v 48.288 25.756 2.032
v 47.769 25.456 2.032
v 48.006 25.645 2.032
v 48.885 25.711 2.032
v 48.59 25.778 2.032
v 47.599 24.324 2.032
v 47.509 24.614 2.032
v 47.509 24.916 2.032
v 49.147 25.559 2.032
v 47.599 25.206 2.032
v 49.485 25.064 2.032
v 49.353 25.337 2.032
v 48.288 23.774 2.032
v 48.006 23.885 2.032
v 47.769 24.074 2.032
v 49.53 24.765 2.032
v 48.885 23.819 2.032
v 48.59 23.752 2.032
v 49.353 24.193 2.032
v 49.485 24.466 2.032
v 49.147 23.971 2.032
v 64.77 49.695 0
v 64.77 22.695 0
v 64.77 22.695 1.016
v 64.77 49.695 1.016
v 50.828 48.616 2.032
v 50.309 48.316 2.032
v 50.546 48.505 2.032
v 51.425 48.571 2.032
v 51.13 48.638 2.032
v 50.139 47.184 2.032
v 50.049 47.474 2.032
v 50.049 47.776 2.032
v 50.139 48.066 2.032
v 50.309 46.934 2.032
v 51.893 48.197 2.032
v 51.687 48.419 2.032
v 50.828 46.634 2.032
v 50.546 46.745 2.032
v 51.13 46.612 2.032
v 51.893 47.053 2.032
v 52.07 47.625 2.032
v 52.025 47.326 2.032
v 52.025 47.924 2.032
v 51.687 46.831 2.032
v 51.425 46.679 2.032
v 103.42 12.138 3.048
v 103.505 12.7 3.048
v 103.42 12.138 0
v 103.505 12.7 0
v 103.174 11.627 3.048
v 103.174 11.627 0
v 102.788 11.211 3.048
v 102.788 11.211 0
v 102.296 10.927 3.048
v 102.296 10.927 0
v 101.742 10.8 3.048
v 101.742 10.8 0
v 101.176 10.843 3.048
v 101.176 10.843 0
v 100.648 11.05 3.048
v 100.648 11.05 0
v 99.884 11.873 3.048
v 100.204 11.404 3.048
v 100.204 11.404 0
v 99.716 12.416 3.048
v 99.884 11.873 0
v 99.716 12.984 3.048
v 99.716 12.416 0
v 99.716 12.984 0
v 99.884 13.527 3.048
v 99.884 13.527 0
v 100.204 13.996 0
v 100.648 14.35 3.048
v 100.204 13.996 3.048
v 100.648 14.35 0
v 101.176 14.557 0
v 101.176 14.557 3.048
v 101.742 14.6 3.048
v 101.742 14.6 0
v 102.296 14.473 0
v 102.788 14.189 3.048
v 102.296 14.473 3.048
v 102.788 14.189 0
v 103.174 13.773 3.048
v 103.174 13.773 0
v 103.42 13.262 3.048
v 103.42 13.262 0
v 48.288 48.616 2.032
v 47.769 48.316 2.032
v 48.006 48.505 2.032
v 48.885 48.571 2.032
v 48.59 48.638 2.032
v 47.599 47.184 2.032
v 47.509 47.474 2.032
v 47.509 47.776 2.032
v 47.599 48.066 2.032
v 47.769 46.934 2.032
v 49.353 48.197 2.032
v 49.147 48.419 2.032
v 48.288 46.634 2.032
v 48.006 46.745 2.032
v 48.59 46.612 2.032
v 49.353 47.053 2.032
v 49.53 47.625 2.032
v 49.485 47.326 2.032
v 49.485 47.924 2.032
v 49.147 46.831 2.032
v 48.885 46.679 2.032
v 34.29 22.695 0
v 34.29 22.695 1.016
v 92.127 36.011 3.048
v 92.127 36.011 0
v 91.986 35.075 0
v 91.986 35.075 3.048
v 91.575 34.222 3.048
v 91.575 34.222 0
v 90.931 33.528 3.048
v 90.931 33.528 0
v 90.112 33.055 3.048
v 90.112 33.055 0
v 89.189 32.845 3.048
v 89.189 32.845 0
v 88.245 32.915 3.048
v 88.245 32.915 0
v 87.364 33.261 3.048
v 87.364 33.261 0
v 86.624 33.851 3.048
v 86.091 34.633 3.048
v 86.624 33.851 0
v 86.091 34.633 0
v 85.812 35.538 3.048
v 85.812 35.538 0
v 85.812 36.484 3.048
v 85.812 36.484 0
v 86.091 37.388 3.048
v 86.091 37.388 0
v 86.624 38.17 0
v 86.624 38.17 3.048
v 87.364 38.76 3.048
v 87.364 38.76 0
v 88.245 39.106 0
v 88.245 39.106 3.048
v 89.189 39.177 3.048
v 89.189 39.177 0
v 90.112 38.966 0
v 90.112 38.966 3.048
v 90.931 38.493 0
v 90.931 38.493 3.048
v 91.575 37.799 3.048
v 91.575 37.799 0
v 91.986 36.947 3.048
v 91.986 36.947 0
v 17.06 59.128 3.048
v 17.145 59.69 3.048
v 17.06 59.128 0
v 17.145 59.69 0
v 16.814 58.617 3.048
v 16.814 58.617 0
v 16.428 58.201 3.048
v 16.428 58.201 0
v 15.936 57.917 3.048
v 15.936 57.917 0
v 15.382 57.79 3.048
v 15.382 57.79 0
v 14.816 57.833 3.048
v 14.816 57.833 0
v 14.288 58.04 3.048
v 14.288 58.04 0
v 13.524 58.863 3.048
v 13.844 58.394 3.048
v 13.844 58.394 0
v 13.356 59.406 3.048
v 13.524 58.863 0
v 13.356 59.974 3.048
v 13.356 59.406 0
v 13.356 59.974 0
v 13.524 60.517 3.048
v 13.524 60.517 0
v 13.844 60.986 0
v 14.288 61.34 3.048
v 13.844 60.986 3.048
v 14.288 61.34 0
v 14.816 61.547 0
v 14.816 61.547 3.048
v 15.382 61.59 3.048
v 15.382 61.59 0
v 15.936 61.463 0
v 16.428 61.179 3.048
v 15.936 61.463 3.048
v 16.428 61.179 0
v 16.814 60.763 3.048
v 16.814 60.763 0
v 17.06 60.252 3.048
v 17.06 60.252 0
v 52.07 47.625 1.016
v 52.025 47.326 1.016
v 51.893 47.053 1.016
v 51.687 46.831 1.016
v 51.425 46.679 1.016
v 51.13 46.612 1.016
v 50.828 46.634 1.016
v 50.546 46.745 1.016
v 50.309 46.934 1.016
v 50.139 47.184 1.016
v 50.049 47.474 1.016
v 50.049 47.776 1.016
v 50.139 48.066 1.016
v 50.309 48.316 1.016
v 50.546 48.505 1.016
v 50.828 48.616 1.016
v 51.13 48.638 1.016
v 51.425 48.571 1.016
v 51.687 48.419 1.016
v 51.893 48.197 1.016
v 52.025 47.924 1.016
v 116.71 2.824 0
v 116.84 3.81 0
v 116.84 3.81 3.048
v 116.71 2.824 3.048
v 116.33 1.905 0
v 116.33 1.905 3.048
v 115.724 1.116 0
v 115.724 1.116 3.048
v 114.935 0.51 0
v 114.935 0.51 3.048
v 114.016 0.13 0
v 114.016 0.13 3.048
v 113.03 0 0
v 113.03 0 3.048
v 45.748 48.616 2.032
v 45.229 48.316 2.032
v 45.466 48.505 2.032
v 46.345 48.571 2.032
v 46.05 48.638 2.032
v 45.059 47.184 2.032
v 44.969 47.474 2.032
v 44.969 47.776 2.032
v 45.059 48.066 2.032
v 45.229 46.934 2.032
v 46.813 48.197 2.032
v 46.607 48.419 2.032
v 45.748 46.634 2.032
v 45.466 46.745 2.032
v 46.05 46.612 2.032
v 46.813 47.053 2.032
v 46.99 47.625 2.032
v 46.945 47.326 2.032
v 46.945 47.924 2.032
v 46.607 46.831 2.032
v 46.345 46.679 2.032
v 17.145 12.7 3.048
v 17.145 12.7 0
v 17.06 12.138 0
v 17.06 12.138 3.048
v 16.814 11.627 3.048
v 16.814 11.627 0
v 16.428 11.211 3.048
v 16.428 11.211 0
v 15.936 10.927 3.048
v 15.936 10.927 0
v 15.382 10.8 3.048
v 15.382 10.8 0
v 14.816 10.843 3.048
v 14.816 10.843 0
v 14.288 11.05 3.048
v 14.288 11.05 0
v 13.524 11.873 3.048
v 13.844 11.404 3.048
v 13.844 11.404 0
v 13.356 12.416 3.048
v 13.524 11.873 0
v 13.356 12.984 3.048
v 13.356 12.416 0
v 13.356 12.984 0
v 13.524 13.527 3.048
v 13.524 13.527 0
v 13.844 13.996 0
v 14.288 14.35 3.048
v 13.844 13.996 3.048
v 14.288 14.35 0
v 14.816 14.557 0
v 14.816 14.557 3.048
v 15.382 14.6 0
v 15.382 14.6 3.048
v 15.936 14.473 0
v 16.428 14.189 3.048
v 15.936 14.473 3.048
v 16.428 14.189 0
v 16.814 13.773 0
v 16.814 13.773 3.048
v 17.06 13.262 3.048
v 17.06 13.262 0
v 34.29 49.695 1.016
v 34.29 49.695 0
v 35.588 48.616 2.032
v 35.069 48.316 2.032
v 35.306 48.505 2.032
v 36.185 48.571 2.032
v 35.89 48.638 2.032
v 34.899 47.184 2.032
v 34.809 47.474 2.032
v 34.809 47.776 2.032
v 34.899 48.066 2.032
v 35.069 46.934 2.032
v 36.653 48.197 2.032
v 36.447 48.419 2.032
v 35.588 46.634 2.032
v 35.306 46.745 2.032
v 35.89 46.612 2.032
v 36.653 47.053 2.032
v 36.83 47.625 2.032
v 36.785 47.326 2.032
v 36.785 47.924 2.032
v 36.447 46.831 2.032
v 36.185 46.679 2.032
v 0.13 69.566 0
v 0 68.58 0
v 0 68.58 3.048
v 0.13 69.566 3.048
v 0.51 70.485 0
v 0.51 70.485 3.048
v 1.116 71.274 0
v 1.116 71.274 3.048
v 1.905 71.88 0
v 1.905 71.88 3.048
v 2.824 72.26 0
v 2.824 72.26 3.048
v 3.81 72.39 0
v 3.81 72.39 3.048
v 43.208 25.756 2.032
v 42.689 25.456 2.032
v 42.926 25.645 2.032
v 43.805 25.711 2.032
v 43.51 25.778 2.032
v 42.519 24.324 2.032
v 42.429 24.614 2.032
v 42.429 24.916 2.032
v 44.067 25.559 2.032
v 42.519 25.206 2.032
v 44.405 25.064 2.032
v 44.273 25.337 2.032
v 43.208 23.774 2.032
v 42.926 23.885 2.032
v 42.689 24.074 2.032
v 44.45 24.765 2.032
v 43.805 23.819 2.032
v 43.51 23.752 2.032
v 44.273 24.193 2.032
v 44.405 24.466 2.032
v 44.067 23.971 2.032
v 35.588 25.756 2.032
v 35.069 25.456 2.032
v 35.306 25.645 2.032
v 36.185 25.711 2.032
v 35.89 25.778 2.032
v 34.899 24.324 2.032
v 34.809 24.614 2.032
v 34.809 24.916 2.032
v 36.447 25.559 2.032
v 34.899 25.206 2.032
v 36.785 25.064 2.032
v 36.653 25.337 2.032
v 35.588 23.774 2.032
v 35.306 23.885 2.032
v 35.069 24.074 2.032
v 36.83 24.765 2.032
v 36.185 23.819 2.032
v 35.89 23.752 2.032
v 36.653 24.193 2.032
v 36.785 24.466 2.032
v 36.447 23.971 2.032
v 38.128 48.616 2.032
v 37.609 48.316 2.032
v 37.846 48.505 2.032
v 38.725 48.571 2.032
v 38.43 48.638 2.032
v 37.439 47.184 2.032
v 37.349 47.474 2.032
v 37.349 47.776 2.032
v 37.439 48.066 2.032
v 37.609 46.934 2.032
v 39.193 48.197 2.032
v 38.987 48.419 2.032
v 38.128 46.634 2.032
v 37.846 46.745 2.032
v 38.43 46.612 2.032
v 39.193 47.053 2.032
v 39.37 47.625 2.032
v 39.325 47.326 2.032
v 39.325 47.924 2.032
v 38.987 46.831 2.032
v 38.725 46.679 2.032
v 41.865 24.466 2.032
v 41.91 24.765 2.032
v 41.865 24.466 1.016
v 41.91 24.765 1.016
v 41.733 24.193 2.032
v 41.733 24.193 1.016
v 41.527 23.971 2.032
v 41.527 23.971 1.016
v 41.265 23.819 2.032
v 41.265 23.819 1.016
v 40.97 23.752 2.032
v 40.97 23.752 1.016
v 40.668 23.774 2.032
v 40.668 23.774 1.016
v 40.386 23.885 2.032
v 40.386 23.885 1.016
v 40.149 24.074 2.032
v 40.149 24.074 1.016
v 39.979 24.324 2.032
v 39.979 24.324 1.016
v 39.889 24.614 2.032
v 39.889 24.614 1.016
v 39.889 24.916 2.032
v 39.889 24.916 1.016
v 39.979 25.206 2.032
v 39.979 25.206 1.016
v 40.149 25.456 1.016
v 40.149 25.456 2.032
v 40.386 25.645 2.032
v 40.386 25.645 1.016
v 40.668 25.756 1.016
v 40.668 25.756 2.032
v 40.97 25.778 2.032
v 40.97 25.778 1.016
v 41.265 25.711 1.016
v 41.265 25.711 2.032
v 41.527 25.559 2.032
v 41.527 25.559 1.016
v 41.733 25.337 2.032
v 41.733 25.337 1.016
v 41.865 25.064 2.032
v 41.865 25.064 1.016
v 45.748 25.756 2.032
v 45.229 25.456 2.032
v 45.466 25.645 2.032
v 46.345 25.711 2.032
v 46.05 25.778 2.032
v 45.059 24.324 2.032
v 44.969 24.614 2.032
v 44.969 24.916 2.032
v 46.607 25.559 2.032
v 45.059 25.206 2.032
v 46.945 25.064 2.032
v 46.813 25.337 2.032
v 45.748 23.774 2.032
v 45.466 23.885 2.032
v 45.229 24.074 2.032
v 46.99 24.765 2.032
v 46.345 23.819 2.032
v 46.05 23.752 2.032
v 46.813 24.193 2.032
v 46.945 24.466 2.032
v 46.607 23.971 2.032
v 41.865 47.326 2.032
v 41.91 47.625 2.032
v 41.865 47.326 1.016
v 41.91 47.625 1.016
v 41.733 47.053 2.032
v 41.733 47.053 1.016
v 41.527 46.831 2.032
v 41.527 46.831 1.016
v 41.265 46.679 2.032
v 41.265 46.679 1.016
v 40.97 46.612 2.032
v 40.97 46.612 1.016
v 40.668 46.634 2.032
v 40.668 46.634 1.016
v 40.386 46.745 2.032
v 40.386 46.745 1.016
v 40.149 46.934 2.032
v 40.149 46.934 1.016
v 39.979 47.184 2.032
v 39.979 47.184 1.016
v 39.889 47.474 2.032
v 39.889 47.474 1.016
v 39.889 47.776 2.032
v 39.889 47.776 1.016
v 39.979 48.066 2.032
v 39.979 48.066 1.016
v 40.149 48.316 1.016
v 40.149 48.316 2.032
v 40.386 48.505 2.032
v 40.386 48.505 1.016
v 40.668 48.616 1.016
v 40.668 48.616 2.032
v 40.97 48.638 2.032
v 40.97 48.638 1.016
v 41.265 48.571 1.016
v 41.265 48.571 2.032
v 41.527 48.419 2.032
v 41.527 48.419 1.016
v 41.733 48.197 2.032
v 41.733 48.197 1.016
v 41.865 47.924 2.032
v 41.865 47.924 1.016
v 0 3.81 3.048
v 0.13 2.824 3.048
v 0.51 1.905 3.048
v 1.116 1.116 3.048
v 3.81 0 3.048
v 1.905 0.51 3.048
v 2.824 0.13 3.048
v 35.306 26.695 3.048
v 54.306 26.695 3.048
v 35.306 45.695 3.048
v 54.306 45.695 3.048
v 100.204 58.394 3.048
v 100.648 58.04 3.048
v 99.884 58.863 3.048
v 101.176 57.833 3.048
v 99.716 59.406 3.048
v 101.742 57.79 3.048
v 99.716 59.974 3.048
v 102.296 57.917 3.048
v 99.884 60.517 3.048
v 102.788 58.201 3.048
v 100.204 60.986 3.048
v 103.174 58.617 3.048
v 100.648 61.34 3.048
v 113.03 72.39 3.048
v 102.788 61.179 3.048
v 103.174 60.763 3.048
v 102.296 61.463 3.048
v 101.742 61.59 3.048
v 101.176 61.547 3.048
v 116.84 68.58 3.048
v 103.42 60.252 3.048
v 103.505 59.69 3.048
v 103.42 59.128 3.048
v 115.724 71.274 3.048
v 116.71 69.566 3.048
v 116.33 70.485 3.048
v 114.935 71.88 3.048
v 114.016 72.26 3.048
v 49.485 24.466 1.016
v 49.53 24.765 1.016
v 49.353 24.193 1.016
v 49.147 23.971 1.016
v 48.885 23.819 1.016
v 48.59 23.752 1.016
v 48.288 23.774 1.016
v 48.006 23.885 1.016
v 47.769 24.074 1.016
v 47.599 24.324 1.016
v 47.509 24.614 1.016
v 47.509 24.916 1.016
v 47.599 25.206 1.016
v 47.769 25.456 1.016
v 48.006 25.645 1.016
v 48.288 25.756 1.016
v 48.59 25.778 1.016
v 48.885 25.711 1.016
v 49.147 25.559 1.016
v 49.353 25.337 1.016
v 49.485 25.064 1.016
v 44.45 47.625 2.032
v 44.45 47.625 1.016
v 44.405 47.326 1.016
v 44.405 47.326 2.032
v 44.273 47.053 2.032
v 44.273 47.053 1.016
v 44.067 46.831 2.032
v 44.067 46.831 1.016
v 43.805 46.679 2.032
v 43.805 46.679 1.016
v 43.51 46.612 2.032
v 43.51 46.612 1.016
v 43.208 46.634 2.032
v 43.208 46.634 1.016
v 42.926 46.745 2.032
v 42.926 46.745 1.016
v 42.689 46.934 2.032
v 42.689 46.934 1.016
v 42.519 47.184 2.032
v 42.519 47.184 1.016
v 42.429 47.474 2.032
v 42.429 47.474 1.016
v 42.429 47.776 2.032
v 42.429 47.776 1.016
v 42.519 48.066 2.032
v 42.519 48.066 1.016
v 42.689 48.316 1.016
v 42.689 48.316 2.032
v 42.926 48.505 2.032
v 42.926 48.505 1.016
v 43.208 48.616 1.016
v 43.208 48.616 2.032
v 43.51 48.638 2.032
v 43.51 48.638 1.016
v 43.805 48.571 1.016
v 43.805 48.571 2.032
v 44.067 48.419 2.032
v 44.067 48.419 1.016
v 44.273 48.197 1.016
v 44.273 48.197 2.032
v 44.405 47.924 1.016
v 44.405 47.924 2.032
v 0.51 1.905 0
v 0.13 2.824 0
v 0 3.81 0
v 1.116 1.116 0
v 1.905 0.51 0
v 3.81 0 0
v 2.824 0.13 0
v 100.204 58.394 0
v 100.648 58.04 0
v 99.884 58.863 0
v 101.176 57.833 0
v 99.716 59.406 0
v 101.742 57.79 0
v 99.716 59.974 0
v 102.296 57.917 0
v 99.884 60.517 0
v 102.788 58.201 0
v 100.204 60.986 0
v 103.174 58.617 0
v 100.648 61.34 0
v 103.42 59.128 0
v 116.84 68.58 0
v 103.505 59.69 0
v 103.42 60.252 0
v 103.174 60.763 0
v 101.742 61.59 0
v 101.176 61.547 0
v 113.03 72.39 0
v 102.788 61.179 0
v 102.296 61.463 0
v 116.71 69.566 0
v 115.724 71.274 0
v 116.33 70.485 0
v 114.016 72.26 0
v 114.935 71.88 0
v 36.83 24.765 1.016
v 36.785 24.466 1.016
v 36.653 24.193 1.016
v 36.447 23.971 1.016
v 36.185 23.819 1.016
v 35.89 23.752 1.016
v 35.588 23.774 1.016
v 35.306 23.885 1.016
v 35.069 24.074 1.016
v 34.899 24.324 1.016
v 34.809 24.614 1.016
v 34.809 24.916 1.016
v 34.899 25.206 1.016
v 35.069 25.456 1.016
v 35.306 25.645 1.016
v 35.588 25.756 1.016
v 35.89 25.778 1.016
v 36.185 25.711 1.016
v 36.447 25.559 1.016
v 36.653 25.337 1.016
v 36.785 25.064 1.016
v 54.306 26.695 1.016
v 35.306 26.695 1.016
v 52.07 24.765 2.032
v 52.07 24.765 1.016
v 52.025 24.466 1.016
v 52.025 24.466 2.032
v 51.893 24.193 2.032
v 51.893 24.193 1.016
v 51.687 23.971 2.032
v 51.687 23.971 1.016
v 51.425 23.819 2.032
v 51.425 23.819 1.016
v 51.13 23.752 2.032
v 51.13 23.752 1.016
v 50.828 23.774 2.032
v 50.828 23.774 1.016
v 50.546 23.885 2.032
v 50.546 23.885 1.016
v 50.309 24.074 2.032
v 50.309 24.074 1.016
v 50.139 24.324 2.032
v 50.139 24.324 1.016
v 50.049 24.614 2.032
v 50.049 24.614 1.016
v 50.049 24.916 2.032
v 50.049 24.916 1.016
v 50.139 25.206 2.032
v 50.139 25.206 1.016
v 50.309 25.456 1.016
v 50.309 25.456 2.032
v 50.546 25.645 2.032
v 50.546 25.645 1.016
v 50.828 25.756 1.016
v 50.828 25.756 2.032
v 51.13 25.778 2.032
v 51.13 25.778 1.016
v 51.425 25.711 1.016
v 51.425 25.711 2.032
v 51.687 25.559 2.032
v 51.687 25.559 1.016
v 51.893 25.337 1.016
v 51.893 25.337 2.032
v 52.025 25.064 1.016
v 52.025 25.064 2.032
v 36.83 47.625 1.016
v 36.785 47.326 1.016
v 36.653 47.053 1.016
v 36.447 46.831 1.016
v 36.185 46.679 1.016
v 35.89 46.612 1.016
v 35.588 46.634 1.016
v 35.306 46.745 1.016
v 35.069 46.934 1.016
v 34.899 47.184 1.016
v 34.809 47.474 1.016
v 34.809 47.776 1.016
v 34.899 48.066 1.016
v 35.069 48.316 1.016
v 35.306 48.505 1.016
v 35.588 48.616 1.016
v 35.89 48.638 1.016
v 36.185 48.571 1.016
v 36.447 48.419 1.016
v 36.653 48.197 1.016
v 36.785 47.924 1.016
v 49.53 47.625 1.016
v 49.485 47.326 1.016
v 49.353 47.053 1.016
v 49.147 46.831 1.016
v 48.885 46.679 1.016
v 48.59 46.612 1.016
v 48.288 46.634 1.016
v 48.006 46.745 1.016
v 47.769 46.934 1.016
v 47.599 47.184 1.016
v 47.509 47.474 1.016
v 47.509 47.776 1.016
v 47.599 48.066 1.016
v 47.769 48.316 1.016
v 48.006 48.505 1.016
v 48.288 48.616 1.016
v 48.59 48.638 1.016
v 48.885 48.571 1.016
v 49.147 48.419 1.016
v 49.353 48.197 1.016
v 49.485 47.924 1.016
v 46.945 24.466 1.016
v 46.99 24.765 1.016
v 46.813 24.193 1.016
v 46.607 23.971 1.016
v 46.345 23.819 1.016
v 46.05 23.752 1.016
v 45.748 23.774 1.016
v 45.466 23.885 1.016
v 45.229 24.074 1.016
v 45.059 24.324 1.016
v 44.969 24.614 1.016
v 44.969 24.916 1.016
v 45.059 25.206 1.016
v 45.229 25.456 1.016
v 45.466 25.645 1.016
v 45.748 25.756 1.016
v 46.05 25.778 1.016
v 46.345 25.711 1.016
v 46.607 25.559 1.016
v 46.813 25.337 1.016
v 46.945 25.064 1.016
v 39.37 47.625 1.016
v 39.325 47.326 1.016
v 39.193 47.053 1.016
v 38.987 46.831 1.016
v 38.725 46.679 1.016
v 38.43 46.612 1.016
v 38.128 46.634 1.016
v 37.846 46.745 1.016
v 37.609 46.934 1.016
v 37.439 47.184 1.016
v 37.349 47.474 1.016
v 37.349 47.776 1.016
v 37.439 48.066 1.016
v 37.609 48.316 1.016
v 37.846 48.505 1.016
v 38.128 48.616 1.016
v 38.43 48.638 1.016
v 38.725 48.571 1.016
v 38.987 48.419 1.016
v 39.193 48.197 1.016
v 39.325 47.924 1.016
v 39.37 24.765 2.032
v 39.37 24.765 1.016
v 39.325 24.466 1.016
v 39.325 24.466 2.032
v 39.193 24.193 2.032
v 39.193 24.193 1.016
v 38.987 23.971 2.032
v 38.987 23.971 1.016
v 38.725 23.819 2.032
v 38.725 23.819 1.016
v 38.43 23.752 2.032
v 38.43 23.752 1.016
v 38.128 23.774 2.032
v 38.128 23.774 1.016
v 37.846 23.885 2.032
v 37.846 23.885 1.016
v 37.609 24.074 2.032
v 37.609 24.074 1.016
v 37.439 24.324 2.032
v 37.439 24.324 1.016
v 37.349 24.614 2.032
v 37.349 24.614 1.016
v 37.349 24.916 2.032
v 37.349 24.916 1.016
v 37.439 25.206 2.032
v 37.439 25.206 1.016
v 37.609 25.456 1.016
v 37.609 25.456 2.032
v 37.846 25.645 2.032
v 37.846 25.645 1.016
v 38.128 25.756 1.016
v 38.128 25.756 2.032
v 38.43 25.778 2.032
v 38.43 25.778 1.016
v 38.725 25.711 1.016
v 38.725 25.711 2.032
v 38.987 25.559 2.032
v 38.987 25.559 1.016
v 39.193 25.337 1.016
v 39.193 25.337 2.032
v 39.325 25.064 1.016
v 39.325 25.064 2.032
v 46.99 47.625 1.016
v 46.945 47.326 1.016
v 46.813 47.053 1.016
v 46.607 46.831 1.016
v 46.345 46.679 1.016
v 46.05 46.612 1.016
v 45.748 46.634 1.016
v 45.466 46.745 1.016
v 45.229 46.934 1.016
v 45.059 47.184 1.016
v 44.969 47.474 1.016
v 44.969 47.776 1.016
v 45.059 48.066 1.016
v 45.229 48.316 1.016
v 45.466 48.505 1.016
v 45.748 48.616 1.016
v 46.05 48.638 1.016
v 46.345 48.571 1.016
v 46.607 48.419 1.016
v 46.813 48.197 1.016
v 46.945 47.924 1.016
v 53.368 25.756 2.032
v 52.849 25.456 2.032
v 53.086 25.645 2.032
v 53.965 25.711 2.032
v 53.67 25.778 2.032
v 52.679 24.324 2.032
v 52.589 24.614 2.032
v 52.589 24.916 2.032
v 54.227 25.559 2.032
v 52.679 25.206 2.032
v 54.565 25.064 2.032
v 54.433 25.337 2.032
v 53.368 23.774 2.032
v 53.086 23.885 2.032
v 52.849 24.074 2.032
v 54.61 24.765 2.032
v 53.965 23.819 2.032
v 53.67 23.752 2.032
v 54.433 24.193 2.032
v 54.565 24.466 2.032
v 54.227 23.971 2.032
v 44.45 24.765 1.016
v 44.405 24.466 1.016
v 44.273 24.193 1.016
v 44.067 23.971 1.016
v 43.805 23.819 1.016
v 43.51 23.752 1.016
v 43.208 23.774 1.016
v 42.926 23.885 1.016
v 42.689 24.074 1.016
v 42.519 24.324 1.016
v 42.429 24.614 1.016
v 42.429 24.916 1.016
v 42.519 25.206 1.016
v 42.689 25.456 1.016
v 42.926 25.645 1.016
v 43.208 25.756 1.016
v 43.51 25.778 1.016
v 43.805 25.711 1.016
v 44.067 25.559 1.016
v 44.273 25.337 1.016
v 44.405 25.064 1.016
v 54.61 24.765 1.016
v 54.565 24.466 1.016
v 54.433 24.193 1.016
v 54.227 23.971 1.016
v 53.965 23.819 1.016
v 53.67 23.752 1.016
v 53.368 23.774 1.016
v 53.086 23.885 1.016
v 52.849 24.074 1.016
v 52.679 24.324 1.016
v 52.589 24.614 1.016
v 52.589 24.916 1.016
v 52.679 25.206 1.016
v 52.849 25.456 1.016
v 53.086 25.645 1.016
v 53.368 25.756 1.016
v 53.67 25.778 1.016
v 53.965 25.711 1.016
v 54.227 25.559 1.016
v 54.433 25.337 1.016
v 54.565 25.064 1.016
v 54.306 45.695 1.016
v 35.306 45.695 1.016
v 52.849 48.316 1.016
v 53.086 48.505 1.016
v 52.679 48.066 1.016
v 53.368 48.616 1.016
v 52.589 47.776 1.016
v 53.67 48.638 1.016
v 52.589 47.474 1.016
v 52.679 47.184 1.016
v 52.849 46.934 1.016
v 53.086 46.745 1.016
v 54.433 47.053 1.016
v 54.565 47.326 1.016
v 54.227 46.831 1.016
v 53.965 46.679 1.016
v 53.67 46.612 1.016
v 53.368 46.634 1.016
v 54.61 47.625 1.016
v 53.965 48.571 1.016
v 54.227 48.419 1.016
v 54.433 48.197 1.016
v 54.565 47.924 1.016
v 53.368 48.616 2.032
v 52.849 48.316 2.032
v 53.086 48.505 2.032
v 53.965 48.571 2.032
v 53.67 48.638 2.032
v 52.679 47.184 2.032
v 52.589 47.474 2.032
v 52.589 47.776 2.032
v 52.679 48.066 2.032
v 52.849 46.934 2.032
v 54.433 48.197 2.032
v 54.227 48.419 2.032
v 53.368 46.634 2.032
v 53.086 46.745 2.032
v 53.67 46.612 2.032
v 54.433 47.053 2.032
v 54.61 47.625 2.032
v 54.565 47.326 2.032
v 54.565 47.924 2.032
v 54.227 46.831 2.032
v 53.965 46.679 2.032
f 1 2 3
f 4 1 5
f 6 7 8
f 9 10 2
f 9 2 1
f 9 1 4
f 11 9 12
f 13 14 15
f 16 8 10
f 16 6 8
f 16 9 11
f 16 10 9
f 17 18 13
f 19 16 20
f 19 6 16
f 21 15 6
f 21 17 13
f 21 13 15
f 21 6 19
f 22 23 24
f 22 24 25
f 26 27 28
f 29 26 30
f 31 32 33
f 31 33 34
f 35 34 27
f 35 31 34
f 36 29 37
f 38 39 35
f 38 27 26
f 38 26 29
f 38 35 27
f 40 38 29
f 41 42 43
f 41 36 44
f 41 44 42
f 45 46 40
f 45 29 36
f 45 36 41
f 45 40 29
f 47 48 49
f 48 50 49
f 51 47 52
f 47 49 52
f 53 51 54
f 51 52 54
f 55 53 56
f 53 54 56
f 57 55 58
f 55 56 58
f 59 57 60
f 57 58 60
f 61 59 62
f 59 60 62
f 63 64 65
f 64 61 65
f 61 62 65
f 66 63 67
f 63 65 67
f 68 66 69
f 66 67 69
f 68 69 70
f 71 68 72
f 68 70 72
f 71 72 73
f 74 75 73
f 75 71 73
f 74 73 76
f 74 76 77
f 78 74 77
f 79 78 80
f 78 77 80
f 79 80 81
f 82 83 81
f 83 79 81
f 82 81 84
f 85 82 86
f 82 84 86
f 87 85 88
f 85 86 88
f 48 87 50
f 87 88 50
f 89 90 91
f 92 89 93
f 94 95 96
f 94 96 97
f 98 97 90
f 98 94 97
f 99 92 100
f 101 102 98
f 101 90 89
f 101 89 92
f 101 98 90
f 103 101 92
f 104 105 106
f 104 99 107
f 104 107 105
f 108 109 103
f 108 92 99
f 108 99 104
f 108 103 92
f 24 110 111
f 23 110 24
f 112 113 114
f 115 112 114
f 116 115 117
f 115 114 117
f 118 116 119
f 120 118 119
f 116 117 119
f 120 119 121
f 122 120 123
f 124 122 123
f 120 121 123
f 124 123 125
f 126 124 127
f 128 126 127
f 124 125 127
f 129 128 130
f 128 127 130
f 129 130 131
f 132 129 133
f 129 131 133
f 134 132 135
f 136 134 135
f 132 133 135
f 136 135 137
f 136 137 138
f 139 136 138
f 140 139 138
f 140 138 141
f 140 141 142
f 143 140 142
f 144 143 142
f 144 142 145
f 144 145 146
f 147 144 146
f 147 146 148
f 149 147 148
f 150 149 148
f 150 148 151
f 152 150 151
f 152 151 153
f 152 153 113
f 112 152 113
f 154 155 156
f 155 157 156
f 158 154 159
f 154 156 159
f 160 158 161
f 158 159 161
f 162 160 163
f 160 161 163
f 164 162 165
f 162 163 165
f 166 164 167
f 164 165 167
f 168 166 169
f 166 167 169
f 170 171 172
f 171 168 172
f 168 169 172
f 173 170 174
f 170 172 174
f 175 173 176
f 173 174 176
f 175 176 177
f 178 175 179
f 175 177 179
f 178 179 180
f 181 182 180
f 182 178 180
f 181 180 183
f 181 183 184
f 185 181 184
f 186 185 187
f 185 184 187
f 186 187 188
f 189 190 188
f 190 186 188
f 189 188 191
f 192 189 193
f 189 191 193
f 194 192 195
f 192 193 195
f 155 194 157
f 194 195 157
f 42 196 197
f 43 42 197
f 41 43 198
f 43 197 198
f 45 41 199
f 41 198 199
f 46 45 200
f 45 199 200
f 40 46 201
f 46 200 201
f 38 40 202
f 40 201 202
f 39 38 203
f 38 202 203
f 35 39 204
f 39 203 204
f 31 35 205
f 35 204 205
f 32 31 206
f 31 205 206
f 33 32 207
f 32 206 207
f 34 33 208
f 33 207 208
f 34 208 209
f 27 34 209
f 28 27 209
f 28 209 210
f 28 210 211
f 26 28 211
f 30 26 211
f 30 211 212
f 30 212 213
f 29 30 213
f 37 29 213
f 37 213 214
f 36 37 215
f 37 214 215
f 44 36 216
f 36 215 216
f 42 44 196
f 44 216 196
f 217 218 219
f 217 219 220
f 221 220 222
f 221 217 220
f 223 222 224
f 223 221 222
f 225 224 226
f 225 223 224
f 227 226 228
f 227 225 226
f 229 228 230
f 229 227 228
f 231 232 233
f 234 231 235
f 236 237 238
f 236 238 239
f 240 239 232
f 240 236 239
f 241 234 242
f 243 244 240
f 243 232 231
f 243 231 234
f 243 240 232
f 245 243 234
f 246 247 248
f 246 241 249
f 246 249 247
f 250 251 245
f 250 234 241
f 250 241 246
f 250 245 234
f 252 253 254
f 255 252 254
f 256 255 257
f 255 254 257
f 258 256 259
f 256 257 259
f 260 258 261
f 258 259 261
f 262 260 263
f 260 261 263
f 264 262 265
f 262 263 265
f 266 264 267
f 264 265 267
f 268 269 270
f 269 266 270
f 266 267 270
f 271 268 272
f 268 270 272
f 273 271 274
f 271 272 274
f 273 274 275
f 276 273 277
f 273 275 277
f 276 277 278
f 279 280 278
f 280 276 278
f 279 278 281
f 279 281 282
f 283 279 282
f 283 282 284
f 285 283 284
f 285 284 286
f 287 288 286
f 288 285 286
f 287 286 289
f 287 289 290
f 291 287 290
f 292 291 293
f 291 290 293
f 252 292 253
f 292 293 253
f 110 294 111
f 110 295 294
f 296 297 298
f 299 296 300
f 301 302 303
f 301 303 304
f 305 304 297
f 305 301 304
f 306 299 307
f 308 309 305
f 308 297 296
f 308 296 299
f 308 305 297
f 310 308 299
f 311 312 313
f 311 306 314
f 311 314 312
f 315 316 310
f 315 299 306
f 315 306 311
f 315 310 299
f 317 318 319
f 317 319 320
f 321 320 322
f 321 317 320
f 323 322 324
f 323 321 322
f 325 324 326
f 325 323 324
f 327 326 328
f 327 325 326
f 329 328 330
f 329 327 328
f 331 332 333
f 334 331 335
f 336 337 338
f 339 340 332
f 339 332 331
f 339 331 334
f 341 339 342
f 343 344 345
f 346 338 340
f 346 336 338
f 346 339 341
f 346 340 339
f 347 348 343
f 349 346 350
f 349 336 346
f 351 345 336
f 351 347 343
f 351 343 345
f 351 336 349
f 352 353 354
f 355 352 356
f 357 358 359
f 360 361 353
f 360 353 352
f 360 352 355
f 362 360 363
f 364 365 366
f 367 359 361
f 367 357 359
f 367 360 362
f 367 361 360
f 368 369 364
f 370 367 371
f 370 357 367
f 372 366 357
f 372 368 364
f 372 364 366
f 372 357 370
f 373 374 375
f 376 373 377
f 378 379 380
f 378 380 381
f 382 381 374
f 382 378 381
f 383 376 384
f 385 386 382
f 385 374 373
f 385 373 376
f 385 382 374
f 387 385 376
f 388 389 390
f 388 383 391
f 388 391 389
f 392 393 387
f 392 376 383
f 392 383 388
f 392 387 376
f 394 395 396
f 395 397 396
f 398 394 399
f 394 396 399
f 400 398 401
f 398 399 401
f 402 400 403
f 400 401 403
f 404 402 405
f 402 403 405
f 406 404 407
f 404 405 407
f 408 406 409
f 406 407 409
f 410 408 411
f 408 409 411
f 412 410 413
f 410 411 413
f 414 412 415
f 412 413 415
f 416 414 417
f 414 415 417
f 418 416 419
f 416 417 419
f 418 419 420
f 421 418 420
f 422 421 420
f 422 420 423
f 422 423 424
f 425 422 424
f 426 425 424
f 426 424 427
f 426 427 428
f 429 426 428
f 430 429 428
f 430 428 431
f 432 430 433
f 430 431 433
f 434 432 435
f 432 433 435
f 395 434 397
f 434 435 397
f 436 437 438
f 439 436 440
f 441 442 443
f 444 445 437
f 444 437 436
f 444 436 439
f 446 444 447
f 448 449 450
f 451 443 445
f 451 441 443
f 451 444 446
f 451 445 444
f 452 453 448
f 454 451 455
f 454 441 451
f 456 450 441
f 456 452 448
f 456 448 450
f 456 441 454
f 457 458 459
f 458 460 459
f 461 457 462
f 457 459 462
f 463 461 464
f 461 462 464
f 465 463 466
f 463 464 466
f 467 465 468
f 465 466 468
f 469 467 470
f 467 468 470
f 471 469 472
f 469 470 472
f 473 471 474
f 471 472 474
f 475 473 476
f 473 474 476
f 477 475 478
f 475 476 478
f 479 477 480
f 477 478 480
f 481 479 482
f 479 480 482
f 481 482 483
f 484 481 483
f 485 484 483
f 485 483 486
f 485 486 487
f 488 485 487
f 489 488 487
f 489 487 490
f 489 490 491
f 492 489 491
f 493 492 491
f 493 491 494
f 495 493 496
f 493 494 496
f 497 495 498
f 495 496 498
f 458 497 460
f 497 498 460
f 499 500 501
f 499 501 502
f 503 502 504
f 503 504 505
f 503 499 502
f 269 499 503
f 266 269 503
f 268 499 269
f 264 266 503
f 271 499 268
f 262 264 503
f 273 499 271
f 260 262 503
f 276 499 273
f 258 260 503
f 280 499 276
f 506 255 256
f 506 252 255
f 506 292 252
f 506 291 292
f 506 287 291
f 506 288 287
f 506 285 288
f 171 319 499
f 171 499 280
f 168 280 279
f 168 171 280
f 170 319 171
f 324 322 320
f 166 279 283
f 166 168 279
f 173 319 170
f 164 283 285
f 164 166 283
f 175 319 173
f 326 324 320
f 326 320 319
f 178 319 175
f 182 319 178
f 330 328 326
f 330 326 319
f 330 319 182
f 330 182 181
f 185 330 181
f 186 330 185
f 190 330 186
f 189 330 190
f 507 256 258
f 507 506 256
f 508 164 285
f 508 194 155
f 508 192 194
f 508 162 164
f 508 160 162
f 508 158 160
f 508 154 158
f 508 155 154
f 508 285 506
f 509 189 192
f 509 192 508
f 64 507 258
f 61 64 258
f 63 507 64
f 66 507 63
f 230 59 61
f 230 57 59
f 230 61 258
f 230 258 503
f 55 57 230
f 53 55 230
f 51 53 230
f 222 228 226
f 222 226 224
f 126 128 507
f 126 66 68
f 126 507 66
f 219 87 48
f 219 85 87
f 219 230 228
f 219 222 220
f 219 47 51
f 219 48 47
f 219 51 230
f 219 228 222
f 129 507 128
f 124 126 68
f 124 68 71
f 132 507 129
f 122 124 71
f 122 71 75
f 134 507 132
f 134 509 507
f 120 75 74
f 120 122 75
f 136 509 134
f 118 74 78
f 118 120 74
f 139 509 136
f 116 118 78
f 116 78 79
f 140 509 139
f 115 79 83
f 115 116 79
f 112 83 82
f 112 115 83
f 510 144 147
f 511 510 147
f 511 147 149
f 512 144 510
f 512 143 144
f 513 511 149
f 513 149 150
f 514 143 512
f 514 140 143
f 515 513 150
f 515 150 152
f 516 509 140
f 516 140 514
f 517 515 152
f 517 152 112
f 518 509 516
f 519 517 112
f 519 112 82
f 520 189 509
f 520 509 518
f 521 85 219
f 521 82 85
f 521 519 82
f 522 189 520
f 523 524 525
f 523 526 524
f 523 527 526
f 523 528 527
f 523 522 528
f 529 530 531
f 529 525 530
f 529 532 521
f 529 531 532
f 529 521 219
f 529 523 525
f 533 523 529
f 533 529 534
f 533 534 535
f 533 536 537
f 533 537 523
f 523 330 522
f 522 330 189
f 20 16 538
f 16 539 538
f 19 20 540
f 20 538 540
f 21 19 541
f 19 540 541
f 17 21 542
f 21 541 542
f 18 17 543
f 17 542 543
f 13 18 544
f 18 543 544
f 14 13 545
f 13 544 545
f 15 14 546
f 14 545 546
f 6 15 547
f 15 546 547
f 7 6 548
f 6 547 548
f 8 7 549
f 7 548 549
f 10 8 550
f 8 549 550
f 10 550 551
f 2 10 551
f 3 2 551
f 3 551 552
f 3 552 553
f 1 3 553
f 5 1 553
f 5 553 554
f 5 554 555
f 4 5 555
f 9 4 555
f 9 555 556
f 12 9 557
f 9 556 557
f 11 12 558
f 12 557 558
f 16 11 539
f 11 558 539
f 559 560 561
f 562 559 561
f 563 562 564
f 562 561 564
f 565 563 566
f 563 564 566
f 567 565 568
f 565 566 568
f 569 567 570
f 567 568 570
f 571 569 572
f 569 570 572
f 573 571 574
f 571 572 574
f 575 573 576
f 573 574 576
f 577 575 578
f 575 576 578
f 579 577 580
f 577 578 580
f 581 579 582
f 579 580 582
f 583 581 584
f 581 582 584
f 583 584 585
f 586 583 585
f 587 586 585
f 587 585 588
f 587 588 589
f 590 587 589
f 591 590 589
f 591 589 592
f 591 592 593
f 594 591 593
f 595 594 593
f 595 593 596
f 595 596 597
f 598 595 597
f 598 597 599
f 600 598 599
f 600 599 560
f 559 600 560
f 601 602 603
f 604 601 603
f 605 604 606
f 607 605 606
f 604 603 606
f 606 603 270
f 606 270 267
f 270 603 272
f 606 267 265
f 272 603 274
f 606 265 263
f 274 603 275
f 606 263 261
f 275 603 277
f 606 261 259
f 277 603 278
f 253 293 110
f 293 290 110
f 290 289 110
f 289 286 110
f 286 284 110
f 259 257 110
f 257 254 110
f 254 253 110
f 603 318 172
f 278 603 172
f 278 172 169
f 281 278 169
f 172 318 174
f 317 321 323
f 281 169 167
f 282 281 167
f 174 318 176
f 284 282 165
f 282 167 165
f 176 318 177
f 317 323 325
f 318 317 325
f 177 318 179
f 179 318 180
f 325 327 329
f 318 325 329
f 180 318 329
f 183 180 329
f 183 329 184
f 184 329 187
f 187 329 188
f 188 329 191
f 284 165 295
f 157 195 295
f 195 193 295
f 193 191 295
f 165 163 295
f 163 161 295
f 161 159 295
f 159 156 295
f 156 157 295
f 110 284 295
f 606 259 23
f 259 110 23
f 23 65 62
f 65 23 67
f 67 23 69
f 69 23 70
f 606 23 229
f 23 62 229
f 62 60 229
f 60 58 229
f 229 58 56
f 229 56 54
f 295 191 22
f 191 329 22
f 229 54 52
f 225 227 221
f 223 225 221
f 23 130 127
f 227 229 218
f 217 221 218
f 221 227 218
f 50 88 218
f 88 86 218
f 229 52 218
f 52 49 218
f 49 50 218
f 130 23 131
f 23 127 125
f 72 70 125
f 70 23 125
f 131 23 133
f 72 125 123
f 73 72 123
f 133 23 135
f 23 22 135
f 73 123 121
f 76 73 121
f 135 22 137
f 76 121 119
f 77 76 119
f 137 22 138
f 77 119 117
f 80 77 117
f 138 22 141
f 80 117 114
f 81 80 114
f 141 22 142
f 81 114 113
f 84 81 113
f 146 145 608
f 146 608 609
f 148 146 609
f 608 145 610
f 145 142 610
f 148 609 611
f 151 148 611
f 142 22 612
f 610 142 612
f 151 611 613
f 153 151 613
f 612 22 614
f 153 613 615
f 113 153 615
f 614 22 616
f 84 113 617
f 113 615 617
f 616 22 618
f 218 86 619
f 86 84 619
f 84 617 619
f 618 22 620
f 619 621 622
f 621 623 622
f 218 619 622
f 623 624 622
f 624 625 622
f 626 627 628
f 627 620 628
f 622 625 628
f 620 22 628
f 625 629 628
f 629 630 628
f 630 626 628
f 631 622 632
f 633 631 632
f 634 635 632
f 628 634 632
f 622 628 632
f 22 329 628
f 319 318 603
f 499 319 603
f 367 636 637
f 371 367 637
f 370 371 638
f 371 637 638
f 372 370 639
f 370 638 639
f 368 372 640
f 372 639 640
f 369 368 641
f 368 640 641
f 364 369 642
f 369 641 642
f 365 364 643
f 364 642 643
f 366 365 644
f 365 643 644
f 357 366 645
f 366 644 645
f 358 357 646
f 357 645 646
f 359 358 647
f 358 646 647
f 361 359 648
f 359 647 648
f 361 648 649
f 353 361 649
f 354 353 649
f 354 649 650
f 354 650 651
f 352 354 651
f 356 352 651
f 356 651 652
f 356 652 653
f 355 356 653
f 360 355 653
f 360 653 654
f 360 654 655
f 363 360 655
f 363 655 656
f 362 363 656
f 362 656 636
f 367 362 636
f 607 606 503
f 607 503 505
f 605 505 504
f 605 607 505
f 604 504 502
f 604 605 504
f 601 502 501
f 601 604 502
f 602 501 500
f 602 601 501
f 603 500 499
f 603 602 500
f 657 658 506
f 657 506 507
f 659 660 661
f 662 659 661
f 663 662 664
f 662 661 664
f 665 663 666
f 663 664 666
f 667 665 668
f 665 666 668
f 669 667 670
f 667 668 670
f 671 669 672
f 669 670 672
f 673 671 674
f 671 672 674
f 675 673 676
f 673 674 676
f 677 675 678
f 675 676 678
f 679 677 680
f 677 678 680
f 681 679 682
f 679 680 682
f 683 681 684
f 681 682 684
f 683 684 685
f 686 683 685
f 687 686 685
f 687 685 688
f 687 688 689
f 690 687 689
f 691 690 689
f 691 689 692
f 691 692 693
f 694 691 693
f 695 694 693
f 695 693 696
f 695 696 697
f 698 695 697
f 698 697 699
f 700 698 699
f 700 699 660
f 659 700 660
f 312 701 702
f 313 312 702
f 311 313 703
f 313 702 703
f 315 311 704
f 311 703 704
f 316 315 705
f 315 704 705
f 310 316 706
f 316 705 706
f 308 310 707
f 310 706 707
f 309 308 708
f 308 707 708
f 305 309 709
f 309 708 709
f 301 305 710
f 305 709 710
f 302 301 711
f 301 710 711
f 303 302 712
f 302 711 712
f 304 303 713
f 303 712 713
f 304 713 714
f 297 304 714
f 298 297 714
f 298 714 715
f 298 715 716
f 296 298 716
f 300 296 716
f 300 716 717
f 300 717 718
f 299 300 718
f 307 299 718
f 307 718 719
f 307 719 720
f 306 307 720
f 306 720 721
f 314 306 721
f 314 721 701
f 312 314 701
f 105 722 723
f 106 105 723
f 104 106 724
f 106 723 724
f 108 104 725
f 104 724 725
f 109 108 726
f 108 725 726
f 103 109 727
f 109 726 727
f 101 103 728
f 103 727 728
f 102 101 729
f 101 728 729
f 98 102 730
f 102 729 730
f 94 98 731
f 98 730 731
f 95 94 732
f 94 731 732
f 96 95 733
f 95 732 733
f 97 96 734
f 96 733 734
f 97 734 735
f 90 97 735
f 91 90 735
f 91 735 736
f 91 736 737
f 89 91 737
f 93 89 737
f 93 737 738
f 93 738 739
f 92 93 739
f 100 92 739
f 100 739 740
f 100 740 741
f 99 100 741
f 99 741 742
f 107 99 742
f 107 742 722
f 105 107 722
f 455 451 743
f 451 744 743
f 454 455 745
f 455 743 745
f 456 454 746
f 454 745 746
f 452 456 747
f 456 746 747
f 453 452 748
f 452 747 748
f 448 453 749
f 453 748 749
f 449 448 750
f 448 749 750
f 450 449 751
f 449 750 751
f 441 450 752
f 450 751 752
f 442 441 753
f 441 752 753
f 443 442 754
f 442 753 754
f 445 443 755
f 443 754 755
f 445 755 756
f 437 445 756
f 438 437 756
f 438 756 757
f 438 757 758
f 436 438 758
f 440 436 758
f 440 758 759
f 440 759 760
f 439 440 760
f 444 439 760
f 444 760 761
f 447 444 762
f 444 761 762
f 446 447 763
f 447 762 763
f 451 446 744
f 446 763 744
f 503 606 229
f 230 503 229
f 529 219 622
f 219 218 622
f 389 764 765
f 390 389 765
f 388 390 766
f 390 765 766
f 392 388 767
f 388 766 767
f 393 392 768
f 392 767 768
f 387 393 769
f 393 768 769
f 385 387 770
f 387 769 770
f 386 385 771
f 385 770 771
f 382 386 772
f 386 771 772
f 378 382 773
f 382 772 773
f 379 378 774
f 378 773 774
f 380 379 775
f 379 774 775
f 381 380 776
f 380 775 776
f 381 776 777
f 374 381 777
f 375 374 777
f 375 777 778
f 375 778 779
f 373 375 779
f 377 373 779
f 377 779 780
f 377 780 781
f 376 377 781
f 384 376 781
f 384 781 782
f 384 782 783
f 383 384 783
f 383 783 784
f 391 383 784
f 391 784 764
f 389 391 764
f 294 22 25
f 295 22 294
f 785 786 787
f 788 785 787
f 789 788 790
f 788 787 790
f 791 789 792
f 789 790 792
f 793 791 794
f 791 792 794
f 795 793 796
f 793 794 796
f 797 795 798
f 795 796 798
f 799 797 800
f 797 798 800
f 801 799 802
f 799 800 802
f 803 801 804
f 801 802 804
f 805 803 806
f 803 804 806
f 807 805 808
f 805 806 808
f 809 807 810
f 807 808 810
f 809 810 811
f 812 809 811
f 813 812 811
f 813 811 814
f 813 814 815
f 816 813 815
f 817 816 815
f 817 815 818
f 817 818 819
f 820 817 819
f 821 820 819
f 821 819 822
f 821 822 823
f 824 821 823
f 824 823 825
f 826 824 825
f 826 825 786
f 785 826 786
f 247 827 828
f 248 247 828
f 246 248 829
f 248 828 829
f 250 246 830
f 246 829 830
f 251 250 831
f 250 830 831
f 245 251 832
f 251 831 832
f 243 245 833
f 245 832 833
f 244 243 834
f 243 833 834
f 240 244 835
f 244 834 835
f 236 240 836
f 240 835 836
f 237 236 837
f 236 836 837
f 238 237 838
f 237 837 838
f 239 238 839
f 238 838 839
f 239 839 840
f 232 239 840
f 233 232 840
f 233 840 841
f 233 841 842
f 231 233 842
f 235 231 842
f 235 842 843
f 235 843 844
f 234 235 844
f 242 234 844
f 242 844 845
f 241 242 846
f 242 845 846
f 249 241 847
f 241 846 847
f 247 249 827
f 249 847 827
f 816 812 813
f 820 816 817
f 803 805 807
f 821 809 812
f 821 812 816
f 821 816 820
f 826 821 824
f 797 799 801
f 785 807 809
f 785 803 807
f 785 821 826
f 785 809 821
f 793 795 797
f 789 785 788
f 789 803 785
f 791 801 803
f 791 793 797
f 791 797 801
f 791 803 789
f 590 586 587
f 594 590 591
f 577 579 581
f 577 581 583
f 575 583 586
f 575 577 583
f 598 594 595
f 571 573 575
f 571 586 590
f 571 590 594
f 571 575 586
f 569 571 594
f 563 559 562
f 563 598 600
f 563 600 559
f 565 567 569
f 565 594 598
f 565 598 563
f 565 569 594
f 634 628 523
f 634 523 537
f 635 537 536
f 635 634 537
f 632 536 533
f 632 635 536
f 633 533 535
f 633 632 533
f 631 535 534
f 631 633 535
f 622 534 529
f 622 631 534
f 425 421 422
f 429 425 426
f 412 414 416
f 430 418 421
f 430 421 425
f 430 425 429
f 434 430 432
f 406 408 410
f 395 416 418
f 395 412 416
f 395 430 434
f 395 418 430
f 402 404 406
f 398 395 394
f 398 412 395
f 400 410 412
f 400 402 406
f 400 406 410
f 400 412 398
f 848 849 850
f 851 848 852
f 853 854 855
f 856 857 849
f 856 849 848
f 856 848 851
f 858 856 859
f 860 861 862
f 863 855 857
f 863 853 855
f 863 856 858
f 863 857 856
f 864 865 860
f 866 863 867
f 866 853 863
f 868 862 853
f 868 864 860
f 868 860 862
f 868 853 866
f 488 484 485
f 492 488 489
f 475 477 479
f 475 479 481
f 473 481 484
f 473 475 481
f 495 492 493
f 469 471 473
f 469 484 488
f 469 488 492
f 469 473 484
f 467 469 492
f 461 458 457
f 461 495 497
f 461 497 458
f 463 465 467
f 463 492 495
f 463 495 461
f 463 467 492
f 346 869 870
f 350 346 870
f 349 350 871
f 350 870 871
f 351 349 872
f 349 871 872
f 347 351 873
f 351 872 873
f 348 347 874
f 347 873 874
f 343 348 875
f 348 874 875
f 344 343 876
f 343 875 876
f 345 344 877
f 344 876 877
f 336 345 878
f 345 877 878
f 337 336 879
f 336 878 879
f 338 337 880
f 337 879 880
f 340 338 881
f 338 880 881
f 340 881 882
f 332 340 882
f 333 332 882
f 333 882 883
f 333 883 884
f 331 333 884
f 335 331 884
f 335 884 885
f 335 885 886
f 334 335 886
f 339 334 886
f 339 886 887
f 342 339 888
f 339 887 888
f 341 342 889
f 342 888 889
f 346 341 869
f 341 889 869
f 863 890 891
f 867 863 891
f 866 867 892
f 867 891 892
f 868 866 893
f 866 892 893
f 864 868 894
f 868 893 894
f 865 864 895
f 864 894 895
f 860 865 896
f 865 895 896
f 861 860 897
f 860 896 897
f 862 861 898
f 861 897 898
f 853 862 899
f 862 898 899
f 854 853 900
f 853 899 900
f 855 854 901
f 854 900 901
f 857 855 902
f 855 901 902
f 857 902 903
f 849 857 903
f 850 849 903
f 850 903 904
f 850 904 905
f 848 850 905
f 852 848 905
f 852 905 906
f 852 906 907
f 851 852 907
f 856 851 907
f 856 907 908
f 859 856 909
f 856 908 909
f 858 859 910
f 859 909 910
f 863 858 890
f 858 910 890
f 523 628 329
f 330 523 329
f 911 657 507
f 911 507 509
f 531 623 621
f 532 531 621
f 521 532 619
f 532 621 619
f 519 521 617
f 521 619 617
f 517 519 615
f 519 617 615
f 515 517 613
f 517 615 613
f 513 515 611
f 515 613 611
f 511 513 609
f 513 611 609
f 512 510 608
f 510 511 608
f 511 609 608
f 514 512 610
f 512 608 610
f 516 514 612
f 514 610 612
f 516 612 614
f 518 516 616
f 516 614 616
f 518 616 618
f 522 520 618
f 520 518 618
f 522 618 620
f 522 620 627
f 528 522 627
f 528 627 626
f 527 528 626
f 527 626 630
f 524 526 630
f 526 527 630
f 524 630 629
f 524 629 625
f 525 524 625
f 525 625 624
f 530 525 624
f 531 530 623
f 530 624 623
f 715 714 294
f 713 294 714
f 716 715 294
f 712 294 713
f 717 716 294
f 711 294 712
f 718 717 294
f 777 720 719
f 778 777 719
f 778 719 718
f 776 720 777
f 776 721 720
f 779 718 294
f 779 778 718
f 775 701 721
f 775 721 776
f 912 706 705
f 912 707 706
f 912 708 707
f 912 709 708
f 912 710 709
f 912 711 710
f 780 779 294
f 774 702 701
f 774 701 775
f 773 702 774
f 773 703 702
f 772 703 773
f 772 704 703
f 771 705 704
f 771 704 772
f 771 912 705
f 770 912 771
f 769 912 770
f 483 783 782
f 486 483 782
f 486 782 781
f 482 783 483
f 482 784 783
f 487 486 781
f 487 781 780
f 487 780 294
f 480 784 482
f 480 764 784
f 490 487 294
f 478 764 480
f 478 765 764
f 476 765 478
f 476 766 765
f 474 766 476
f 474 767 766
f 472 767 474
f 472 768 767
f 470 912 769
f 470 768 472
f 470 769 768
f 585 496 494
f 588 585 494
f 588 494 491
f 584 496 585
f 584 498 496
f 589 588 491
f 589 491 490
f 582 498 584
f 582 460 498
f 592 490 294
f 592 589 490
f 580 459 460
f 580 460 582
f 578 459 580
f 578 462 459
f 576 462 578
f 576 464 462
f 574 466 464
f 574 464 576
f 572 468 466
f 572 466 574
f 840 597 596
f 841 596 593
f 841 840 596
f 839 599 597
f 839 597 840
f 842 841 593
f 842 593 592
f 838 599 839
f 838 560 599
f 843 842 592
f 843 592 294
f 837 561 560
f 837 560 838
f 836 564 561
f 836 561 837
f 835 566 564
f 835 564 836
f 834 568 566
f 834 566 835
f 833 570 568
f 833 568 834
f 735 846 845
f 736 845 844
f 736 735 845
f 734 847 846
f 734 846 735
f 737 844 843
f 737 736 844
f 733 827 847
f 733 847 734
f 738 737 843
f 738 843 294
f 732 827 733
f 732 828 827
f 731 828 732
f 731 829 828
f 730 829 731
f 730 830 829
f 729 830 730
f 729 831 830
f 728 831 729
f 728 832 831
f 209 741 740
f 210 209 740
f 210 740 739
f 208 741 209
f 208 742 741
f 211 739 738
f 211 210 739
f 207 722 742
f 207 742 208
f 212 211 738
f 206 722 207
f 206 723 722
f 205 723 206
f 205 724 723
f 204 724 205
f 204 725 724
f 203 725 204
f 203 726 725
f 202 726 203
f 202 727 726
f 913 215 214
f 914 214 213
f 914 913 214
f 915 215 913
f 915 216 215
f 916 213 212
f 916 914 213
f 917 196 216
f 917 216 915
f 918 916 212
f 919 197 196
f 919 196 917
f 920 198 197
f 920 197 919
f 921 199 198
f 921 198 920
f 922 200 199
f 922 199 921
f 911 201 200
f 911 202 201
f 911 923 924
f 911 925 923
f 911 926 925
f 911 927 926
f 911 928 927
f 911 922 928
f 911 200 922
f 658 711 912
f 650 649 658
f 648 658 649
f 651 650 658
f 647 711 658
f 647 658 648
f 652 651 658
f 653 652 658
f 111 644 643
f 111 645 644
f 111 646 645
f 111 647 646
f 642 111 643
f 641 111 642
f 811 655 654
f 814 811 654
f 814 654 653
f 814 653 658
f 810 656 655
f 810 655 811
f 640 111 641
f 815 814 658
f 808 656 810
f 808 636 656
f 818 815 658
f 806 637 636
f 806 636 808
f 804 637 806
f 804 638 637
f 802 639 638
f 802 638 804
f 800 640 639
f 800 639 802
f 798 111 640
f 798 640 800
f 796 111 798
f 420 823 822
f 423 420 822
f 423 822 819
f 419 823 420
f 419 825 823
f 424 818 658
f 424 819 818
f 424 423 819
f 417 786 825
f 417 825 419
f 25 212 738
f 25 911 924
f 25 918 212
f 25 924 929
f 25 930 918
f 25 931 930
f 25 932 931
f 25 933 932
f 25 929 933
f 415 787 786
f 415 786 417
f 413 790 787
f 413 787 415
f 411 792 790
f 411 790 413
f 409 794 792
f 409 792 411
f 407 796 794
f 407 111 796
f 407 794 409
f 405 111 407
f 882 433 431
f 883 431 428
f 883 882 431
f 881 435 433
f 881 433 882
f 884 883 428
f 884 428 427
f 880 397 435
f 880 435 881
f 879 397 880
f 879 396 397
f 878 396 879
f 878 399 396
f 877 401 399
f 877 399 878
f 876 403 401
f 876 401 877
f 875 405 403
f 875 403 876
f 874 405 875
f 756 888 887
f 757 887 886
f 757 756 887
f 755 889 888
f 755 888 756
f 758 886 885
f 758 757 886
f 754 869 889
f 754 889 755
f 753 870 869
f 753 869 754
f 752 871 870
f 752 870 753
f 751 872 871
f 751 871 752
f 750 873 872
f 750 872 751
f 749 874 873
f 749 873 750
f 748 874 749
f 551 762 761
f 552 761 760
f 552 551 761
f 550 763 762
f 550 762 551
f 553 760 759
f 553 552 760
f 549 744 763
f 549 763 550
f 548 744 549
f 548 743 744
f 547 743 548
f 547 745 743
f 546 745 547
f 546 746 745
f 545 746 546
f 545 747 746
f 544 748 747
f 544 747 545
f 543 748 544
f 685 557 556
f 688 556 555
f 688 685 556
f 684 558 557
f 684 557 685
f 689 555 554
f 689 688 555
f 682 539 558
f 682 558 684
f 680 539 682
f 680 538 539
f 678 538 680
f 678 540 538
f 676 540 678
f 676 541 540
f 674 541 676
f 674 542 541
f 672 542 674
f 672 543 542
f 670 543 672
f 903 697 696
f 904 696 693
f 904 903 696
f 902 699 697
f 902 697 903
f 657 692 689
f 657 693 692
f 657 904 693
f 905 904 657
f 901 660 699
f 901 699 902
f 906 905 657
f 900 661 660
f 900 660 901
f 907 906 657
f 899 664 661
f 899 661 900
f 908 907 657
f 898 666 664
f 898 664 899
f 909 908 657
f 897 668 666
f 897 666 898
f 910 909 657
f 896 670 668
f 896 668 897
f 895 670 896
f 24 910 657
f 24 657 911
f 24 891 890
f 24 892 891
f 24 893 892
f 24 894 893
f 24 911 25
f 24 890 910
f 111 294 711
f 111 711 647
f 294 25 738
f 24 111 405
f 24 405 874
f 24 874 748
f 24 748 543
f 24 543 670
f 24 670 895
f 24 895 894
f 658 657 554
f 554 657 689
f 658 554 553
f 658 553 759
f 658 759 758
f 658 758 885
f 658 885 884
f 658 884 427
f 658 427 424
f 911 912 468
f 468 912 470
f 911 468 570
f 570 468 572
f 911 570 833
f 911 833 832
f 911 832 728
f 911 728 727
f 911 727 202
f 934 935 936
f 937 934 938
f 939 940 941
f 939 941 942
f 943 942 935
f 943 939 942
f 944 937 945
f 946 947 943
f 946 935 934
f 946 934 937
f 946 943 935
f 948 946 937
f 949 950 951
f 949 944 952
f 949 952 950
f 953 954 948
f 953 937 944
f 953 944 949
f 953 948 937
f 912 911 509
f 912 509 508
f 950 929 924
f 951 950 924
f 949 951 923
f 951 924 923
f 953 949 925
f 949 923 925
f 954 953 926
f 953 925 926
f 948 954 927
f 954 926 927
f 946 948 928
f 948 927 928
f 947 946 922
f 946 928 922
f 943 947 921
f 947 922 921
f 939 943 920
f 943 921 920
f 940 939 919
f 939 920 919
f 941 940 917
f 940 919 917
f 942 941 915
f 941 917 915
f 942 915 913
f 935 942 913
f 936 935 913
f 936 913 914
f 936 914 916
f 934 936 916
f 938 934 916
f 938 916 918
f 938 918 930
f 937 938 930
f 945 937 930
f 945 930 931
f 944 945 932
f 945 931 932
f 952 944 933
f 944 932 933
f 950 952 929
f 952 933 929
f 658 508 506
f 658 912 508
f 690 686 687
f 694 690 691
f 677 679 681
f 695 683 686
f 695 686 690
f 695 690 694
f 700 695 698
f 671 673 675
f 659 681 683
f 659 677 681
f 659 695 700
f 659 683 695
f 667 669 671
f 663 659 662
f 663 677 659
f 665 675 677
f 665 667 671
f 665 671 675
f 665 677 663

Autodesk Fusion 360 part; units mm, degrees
sketch "Sketch1" plane through (0, 0, 0) normal (0, 0, 1) x (1, 0, 0)
  line L0 (3.81, 0) -> (113.03, 0)
  line L1 (116.84, 3.81) -> (116.84, 68.58)
  line L2 (113.03, 72.39) -> (3.81, 72.39)
  line L3 (0, 68.58) -> (0, 3.81)
  arc A0 (0, 3.81) -> (3.81, 0) centre (3.81, 3.81) ccw
  arc A1 (113.03, 0) -> (116.84, 3.81) centre (113.03, 3.81) ccw
  arc A2 (116.84, 68.58) -> (113.03, 72.39) centre (113.03, 68.58) ccw
  arc A3 (3.81, 72.39) -> (0, 68.58) centre (3.81, 68.58) ccw
  circle A4 centre (15.24, 12.7) radius 1.905
  circle A5 centre (101.6, 12.7) radius 1.905
  circle A6 centre (101.6, 59.69) radius 1.905
  circle A7 centre (15.24, 59.69) radius 1.905
  point P0 (116.84, 0)
  point P1 (0, 72.39)
  dimension "d1" = 116.84
  dimension "d2" = 72.39
  dimension "d3" = 3.81
  dimension "d4" = 3.81
  dimension "d5" = 3.81
  dimension "d6" = 3.81
  dimension "d7" = 3.81
  dimension "d8" = 15.24
  dimension "d9" = 12.7
  dimension "d10" = 3.81
  dimension "d11" = 3.81
  dimension "d12" = 3.81
extrude "Extrude1" add sketch "Sketch1" along normal blind 3.048
sketch "Sketch2" plane through (0, 0, 0) normal (0, 0, -1) x (1, 0, 0)
  circle A0 centre (15.24, -59.69) radius 1.905
  circle A1 centre (101.6, -59.69) radius 1.905
  circle A2 centre (15.24, -12.7) radius 1.905
  circle A3 centre (101.6, -12.7) radius 1.905
  arc A4 (0, -68.58) -> (3.81, -72.39) centre (3.81, -68.58) ccw
  line L0 (3.81, -72.39) -> (113.03, -72.39)
  arc A5 (113.03, -72.39) -> (116.84, -68.58) centre (113.03, -68.58) ccw
  line L1 (116.84, -68.58) -> (116.84, -3.81)
  arc A6 (116.84, -3.81) -> (113.03, 0) centre (113.03, -3.81) ccw
  line L2 (113.03, 0) -> (3.81, 0)
  arc A7 (3.81, 0) -> (0, -3.81) centre (3.81, -3.81) ccw
  line L3 (0, -3.81) -> (0, -68.58)
  line L4 (34.29, -22.695) -> (64.77, -22.695)
  line L5 (64.77, -22.695) -> (64.77, -49.695)
  line L6 (64.77, -49.695) -> (34.29, -49.695)
  line L7 (34.29, -49.695) -> (34.29, -22.695)
  circle A8 centre (88.9518, -36.0108) radius 3.175
  line L8 (0, -36.195) -> (116.84, -36.195) construction
  line L9 (35.306, -26.695) -> (54.306, -26.695)
  line L10 (54.306, -26.695) -> (54.306, -45.695)
  line L11 (54.306, -45.695) -> (35.306, -45.695)
  line L12 (35.306, -45.695) -> (35.306, -26.695)
  line L13 (35.306, -26.695) -> (54.306, -45.695) construction
  line L14 (54.306, -26.695) -> (35.306, -45.695) construction
  circle A9 centre (35.814, -24.765) radius 1.016
  circle A10 centre (38.354, -24.765) radius 1.016
  circle A11 centre (40.894, -24.765) radius 1.016
  circle A12 centre (43.434, -24.765) radius 1.016
  circle A13 centre (45.974, -24.765) radius 1.016
  circle A14 centre (48.514, -24.765) radius 1.016
  circle A15 centre (51.054, -24.765) radius 1.016
  circle A16 centre (53.594, -24.765) radius 1.016
  circle A17 centre (35.814, -47.625) radius 1.016
  circle A18 centre (38.354, -47.625) radius 1.016
  circle A19 centre (40.894, -47.625) radius 1.016
  circle A20 centre (43.434, -47.625) radius 1.016
  circle A21 centre (45.974, -47.625) radius 1.016
  circle A22 centre (48.514, -47.625) radius 1.016
  circle A23 centre (51.054, -47.625) radius 1.016
  circle A24 centre (53.594, -47.625) radius 1.016
  point P0 (44.806, -36.195)
  dimension "d15" = 30.48
  dimension "d16" = 27
  dimension "d18" = 34.29
  dimension "d19" = 6.35
  dimension "d20" = 19
  dimension "d21" = 19
  dimension "d22" = 1.016
  dimension "d23" = 2.032
  dimension "d26" = 2.54
  dimension "d27" = -22.86
  dimension "d29" = 1.524
  dimension "d37" = 11.43
extrude "Extrude2" cut sketch "Sketch2" against normal through all contours L9 L10 L11 L12
extrude "Extrude3" cut sketch "Sketch2" against normal blind 2.032 contours A9 | A10 | A11 | A12 | A13 | A14 | A15 | A16 | A17 | A18 | A19 | A20 | A21 | A22 | A23 | A24
extrude "Extrude4" cut sketch "Sketch2" against normal blind 1.016 contours L4 L5 L6 L7
extrude "Extrude5" cut sketch "Sketch2" against normal through all contours A8
